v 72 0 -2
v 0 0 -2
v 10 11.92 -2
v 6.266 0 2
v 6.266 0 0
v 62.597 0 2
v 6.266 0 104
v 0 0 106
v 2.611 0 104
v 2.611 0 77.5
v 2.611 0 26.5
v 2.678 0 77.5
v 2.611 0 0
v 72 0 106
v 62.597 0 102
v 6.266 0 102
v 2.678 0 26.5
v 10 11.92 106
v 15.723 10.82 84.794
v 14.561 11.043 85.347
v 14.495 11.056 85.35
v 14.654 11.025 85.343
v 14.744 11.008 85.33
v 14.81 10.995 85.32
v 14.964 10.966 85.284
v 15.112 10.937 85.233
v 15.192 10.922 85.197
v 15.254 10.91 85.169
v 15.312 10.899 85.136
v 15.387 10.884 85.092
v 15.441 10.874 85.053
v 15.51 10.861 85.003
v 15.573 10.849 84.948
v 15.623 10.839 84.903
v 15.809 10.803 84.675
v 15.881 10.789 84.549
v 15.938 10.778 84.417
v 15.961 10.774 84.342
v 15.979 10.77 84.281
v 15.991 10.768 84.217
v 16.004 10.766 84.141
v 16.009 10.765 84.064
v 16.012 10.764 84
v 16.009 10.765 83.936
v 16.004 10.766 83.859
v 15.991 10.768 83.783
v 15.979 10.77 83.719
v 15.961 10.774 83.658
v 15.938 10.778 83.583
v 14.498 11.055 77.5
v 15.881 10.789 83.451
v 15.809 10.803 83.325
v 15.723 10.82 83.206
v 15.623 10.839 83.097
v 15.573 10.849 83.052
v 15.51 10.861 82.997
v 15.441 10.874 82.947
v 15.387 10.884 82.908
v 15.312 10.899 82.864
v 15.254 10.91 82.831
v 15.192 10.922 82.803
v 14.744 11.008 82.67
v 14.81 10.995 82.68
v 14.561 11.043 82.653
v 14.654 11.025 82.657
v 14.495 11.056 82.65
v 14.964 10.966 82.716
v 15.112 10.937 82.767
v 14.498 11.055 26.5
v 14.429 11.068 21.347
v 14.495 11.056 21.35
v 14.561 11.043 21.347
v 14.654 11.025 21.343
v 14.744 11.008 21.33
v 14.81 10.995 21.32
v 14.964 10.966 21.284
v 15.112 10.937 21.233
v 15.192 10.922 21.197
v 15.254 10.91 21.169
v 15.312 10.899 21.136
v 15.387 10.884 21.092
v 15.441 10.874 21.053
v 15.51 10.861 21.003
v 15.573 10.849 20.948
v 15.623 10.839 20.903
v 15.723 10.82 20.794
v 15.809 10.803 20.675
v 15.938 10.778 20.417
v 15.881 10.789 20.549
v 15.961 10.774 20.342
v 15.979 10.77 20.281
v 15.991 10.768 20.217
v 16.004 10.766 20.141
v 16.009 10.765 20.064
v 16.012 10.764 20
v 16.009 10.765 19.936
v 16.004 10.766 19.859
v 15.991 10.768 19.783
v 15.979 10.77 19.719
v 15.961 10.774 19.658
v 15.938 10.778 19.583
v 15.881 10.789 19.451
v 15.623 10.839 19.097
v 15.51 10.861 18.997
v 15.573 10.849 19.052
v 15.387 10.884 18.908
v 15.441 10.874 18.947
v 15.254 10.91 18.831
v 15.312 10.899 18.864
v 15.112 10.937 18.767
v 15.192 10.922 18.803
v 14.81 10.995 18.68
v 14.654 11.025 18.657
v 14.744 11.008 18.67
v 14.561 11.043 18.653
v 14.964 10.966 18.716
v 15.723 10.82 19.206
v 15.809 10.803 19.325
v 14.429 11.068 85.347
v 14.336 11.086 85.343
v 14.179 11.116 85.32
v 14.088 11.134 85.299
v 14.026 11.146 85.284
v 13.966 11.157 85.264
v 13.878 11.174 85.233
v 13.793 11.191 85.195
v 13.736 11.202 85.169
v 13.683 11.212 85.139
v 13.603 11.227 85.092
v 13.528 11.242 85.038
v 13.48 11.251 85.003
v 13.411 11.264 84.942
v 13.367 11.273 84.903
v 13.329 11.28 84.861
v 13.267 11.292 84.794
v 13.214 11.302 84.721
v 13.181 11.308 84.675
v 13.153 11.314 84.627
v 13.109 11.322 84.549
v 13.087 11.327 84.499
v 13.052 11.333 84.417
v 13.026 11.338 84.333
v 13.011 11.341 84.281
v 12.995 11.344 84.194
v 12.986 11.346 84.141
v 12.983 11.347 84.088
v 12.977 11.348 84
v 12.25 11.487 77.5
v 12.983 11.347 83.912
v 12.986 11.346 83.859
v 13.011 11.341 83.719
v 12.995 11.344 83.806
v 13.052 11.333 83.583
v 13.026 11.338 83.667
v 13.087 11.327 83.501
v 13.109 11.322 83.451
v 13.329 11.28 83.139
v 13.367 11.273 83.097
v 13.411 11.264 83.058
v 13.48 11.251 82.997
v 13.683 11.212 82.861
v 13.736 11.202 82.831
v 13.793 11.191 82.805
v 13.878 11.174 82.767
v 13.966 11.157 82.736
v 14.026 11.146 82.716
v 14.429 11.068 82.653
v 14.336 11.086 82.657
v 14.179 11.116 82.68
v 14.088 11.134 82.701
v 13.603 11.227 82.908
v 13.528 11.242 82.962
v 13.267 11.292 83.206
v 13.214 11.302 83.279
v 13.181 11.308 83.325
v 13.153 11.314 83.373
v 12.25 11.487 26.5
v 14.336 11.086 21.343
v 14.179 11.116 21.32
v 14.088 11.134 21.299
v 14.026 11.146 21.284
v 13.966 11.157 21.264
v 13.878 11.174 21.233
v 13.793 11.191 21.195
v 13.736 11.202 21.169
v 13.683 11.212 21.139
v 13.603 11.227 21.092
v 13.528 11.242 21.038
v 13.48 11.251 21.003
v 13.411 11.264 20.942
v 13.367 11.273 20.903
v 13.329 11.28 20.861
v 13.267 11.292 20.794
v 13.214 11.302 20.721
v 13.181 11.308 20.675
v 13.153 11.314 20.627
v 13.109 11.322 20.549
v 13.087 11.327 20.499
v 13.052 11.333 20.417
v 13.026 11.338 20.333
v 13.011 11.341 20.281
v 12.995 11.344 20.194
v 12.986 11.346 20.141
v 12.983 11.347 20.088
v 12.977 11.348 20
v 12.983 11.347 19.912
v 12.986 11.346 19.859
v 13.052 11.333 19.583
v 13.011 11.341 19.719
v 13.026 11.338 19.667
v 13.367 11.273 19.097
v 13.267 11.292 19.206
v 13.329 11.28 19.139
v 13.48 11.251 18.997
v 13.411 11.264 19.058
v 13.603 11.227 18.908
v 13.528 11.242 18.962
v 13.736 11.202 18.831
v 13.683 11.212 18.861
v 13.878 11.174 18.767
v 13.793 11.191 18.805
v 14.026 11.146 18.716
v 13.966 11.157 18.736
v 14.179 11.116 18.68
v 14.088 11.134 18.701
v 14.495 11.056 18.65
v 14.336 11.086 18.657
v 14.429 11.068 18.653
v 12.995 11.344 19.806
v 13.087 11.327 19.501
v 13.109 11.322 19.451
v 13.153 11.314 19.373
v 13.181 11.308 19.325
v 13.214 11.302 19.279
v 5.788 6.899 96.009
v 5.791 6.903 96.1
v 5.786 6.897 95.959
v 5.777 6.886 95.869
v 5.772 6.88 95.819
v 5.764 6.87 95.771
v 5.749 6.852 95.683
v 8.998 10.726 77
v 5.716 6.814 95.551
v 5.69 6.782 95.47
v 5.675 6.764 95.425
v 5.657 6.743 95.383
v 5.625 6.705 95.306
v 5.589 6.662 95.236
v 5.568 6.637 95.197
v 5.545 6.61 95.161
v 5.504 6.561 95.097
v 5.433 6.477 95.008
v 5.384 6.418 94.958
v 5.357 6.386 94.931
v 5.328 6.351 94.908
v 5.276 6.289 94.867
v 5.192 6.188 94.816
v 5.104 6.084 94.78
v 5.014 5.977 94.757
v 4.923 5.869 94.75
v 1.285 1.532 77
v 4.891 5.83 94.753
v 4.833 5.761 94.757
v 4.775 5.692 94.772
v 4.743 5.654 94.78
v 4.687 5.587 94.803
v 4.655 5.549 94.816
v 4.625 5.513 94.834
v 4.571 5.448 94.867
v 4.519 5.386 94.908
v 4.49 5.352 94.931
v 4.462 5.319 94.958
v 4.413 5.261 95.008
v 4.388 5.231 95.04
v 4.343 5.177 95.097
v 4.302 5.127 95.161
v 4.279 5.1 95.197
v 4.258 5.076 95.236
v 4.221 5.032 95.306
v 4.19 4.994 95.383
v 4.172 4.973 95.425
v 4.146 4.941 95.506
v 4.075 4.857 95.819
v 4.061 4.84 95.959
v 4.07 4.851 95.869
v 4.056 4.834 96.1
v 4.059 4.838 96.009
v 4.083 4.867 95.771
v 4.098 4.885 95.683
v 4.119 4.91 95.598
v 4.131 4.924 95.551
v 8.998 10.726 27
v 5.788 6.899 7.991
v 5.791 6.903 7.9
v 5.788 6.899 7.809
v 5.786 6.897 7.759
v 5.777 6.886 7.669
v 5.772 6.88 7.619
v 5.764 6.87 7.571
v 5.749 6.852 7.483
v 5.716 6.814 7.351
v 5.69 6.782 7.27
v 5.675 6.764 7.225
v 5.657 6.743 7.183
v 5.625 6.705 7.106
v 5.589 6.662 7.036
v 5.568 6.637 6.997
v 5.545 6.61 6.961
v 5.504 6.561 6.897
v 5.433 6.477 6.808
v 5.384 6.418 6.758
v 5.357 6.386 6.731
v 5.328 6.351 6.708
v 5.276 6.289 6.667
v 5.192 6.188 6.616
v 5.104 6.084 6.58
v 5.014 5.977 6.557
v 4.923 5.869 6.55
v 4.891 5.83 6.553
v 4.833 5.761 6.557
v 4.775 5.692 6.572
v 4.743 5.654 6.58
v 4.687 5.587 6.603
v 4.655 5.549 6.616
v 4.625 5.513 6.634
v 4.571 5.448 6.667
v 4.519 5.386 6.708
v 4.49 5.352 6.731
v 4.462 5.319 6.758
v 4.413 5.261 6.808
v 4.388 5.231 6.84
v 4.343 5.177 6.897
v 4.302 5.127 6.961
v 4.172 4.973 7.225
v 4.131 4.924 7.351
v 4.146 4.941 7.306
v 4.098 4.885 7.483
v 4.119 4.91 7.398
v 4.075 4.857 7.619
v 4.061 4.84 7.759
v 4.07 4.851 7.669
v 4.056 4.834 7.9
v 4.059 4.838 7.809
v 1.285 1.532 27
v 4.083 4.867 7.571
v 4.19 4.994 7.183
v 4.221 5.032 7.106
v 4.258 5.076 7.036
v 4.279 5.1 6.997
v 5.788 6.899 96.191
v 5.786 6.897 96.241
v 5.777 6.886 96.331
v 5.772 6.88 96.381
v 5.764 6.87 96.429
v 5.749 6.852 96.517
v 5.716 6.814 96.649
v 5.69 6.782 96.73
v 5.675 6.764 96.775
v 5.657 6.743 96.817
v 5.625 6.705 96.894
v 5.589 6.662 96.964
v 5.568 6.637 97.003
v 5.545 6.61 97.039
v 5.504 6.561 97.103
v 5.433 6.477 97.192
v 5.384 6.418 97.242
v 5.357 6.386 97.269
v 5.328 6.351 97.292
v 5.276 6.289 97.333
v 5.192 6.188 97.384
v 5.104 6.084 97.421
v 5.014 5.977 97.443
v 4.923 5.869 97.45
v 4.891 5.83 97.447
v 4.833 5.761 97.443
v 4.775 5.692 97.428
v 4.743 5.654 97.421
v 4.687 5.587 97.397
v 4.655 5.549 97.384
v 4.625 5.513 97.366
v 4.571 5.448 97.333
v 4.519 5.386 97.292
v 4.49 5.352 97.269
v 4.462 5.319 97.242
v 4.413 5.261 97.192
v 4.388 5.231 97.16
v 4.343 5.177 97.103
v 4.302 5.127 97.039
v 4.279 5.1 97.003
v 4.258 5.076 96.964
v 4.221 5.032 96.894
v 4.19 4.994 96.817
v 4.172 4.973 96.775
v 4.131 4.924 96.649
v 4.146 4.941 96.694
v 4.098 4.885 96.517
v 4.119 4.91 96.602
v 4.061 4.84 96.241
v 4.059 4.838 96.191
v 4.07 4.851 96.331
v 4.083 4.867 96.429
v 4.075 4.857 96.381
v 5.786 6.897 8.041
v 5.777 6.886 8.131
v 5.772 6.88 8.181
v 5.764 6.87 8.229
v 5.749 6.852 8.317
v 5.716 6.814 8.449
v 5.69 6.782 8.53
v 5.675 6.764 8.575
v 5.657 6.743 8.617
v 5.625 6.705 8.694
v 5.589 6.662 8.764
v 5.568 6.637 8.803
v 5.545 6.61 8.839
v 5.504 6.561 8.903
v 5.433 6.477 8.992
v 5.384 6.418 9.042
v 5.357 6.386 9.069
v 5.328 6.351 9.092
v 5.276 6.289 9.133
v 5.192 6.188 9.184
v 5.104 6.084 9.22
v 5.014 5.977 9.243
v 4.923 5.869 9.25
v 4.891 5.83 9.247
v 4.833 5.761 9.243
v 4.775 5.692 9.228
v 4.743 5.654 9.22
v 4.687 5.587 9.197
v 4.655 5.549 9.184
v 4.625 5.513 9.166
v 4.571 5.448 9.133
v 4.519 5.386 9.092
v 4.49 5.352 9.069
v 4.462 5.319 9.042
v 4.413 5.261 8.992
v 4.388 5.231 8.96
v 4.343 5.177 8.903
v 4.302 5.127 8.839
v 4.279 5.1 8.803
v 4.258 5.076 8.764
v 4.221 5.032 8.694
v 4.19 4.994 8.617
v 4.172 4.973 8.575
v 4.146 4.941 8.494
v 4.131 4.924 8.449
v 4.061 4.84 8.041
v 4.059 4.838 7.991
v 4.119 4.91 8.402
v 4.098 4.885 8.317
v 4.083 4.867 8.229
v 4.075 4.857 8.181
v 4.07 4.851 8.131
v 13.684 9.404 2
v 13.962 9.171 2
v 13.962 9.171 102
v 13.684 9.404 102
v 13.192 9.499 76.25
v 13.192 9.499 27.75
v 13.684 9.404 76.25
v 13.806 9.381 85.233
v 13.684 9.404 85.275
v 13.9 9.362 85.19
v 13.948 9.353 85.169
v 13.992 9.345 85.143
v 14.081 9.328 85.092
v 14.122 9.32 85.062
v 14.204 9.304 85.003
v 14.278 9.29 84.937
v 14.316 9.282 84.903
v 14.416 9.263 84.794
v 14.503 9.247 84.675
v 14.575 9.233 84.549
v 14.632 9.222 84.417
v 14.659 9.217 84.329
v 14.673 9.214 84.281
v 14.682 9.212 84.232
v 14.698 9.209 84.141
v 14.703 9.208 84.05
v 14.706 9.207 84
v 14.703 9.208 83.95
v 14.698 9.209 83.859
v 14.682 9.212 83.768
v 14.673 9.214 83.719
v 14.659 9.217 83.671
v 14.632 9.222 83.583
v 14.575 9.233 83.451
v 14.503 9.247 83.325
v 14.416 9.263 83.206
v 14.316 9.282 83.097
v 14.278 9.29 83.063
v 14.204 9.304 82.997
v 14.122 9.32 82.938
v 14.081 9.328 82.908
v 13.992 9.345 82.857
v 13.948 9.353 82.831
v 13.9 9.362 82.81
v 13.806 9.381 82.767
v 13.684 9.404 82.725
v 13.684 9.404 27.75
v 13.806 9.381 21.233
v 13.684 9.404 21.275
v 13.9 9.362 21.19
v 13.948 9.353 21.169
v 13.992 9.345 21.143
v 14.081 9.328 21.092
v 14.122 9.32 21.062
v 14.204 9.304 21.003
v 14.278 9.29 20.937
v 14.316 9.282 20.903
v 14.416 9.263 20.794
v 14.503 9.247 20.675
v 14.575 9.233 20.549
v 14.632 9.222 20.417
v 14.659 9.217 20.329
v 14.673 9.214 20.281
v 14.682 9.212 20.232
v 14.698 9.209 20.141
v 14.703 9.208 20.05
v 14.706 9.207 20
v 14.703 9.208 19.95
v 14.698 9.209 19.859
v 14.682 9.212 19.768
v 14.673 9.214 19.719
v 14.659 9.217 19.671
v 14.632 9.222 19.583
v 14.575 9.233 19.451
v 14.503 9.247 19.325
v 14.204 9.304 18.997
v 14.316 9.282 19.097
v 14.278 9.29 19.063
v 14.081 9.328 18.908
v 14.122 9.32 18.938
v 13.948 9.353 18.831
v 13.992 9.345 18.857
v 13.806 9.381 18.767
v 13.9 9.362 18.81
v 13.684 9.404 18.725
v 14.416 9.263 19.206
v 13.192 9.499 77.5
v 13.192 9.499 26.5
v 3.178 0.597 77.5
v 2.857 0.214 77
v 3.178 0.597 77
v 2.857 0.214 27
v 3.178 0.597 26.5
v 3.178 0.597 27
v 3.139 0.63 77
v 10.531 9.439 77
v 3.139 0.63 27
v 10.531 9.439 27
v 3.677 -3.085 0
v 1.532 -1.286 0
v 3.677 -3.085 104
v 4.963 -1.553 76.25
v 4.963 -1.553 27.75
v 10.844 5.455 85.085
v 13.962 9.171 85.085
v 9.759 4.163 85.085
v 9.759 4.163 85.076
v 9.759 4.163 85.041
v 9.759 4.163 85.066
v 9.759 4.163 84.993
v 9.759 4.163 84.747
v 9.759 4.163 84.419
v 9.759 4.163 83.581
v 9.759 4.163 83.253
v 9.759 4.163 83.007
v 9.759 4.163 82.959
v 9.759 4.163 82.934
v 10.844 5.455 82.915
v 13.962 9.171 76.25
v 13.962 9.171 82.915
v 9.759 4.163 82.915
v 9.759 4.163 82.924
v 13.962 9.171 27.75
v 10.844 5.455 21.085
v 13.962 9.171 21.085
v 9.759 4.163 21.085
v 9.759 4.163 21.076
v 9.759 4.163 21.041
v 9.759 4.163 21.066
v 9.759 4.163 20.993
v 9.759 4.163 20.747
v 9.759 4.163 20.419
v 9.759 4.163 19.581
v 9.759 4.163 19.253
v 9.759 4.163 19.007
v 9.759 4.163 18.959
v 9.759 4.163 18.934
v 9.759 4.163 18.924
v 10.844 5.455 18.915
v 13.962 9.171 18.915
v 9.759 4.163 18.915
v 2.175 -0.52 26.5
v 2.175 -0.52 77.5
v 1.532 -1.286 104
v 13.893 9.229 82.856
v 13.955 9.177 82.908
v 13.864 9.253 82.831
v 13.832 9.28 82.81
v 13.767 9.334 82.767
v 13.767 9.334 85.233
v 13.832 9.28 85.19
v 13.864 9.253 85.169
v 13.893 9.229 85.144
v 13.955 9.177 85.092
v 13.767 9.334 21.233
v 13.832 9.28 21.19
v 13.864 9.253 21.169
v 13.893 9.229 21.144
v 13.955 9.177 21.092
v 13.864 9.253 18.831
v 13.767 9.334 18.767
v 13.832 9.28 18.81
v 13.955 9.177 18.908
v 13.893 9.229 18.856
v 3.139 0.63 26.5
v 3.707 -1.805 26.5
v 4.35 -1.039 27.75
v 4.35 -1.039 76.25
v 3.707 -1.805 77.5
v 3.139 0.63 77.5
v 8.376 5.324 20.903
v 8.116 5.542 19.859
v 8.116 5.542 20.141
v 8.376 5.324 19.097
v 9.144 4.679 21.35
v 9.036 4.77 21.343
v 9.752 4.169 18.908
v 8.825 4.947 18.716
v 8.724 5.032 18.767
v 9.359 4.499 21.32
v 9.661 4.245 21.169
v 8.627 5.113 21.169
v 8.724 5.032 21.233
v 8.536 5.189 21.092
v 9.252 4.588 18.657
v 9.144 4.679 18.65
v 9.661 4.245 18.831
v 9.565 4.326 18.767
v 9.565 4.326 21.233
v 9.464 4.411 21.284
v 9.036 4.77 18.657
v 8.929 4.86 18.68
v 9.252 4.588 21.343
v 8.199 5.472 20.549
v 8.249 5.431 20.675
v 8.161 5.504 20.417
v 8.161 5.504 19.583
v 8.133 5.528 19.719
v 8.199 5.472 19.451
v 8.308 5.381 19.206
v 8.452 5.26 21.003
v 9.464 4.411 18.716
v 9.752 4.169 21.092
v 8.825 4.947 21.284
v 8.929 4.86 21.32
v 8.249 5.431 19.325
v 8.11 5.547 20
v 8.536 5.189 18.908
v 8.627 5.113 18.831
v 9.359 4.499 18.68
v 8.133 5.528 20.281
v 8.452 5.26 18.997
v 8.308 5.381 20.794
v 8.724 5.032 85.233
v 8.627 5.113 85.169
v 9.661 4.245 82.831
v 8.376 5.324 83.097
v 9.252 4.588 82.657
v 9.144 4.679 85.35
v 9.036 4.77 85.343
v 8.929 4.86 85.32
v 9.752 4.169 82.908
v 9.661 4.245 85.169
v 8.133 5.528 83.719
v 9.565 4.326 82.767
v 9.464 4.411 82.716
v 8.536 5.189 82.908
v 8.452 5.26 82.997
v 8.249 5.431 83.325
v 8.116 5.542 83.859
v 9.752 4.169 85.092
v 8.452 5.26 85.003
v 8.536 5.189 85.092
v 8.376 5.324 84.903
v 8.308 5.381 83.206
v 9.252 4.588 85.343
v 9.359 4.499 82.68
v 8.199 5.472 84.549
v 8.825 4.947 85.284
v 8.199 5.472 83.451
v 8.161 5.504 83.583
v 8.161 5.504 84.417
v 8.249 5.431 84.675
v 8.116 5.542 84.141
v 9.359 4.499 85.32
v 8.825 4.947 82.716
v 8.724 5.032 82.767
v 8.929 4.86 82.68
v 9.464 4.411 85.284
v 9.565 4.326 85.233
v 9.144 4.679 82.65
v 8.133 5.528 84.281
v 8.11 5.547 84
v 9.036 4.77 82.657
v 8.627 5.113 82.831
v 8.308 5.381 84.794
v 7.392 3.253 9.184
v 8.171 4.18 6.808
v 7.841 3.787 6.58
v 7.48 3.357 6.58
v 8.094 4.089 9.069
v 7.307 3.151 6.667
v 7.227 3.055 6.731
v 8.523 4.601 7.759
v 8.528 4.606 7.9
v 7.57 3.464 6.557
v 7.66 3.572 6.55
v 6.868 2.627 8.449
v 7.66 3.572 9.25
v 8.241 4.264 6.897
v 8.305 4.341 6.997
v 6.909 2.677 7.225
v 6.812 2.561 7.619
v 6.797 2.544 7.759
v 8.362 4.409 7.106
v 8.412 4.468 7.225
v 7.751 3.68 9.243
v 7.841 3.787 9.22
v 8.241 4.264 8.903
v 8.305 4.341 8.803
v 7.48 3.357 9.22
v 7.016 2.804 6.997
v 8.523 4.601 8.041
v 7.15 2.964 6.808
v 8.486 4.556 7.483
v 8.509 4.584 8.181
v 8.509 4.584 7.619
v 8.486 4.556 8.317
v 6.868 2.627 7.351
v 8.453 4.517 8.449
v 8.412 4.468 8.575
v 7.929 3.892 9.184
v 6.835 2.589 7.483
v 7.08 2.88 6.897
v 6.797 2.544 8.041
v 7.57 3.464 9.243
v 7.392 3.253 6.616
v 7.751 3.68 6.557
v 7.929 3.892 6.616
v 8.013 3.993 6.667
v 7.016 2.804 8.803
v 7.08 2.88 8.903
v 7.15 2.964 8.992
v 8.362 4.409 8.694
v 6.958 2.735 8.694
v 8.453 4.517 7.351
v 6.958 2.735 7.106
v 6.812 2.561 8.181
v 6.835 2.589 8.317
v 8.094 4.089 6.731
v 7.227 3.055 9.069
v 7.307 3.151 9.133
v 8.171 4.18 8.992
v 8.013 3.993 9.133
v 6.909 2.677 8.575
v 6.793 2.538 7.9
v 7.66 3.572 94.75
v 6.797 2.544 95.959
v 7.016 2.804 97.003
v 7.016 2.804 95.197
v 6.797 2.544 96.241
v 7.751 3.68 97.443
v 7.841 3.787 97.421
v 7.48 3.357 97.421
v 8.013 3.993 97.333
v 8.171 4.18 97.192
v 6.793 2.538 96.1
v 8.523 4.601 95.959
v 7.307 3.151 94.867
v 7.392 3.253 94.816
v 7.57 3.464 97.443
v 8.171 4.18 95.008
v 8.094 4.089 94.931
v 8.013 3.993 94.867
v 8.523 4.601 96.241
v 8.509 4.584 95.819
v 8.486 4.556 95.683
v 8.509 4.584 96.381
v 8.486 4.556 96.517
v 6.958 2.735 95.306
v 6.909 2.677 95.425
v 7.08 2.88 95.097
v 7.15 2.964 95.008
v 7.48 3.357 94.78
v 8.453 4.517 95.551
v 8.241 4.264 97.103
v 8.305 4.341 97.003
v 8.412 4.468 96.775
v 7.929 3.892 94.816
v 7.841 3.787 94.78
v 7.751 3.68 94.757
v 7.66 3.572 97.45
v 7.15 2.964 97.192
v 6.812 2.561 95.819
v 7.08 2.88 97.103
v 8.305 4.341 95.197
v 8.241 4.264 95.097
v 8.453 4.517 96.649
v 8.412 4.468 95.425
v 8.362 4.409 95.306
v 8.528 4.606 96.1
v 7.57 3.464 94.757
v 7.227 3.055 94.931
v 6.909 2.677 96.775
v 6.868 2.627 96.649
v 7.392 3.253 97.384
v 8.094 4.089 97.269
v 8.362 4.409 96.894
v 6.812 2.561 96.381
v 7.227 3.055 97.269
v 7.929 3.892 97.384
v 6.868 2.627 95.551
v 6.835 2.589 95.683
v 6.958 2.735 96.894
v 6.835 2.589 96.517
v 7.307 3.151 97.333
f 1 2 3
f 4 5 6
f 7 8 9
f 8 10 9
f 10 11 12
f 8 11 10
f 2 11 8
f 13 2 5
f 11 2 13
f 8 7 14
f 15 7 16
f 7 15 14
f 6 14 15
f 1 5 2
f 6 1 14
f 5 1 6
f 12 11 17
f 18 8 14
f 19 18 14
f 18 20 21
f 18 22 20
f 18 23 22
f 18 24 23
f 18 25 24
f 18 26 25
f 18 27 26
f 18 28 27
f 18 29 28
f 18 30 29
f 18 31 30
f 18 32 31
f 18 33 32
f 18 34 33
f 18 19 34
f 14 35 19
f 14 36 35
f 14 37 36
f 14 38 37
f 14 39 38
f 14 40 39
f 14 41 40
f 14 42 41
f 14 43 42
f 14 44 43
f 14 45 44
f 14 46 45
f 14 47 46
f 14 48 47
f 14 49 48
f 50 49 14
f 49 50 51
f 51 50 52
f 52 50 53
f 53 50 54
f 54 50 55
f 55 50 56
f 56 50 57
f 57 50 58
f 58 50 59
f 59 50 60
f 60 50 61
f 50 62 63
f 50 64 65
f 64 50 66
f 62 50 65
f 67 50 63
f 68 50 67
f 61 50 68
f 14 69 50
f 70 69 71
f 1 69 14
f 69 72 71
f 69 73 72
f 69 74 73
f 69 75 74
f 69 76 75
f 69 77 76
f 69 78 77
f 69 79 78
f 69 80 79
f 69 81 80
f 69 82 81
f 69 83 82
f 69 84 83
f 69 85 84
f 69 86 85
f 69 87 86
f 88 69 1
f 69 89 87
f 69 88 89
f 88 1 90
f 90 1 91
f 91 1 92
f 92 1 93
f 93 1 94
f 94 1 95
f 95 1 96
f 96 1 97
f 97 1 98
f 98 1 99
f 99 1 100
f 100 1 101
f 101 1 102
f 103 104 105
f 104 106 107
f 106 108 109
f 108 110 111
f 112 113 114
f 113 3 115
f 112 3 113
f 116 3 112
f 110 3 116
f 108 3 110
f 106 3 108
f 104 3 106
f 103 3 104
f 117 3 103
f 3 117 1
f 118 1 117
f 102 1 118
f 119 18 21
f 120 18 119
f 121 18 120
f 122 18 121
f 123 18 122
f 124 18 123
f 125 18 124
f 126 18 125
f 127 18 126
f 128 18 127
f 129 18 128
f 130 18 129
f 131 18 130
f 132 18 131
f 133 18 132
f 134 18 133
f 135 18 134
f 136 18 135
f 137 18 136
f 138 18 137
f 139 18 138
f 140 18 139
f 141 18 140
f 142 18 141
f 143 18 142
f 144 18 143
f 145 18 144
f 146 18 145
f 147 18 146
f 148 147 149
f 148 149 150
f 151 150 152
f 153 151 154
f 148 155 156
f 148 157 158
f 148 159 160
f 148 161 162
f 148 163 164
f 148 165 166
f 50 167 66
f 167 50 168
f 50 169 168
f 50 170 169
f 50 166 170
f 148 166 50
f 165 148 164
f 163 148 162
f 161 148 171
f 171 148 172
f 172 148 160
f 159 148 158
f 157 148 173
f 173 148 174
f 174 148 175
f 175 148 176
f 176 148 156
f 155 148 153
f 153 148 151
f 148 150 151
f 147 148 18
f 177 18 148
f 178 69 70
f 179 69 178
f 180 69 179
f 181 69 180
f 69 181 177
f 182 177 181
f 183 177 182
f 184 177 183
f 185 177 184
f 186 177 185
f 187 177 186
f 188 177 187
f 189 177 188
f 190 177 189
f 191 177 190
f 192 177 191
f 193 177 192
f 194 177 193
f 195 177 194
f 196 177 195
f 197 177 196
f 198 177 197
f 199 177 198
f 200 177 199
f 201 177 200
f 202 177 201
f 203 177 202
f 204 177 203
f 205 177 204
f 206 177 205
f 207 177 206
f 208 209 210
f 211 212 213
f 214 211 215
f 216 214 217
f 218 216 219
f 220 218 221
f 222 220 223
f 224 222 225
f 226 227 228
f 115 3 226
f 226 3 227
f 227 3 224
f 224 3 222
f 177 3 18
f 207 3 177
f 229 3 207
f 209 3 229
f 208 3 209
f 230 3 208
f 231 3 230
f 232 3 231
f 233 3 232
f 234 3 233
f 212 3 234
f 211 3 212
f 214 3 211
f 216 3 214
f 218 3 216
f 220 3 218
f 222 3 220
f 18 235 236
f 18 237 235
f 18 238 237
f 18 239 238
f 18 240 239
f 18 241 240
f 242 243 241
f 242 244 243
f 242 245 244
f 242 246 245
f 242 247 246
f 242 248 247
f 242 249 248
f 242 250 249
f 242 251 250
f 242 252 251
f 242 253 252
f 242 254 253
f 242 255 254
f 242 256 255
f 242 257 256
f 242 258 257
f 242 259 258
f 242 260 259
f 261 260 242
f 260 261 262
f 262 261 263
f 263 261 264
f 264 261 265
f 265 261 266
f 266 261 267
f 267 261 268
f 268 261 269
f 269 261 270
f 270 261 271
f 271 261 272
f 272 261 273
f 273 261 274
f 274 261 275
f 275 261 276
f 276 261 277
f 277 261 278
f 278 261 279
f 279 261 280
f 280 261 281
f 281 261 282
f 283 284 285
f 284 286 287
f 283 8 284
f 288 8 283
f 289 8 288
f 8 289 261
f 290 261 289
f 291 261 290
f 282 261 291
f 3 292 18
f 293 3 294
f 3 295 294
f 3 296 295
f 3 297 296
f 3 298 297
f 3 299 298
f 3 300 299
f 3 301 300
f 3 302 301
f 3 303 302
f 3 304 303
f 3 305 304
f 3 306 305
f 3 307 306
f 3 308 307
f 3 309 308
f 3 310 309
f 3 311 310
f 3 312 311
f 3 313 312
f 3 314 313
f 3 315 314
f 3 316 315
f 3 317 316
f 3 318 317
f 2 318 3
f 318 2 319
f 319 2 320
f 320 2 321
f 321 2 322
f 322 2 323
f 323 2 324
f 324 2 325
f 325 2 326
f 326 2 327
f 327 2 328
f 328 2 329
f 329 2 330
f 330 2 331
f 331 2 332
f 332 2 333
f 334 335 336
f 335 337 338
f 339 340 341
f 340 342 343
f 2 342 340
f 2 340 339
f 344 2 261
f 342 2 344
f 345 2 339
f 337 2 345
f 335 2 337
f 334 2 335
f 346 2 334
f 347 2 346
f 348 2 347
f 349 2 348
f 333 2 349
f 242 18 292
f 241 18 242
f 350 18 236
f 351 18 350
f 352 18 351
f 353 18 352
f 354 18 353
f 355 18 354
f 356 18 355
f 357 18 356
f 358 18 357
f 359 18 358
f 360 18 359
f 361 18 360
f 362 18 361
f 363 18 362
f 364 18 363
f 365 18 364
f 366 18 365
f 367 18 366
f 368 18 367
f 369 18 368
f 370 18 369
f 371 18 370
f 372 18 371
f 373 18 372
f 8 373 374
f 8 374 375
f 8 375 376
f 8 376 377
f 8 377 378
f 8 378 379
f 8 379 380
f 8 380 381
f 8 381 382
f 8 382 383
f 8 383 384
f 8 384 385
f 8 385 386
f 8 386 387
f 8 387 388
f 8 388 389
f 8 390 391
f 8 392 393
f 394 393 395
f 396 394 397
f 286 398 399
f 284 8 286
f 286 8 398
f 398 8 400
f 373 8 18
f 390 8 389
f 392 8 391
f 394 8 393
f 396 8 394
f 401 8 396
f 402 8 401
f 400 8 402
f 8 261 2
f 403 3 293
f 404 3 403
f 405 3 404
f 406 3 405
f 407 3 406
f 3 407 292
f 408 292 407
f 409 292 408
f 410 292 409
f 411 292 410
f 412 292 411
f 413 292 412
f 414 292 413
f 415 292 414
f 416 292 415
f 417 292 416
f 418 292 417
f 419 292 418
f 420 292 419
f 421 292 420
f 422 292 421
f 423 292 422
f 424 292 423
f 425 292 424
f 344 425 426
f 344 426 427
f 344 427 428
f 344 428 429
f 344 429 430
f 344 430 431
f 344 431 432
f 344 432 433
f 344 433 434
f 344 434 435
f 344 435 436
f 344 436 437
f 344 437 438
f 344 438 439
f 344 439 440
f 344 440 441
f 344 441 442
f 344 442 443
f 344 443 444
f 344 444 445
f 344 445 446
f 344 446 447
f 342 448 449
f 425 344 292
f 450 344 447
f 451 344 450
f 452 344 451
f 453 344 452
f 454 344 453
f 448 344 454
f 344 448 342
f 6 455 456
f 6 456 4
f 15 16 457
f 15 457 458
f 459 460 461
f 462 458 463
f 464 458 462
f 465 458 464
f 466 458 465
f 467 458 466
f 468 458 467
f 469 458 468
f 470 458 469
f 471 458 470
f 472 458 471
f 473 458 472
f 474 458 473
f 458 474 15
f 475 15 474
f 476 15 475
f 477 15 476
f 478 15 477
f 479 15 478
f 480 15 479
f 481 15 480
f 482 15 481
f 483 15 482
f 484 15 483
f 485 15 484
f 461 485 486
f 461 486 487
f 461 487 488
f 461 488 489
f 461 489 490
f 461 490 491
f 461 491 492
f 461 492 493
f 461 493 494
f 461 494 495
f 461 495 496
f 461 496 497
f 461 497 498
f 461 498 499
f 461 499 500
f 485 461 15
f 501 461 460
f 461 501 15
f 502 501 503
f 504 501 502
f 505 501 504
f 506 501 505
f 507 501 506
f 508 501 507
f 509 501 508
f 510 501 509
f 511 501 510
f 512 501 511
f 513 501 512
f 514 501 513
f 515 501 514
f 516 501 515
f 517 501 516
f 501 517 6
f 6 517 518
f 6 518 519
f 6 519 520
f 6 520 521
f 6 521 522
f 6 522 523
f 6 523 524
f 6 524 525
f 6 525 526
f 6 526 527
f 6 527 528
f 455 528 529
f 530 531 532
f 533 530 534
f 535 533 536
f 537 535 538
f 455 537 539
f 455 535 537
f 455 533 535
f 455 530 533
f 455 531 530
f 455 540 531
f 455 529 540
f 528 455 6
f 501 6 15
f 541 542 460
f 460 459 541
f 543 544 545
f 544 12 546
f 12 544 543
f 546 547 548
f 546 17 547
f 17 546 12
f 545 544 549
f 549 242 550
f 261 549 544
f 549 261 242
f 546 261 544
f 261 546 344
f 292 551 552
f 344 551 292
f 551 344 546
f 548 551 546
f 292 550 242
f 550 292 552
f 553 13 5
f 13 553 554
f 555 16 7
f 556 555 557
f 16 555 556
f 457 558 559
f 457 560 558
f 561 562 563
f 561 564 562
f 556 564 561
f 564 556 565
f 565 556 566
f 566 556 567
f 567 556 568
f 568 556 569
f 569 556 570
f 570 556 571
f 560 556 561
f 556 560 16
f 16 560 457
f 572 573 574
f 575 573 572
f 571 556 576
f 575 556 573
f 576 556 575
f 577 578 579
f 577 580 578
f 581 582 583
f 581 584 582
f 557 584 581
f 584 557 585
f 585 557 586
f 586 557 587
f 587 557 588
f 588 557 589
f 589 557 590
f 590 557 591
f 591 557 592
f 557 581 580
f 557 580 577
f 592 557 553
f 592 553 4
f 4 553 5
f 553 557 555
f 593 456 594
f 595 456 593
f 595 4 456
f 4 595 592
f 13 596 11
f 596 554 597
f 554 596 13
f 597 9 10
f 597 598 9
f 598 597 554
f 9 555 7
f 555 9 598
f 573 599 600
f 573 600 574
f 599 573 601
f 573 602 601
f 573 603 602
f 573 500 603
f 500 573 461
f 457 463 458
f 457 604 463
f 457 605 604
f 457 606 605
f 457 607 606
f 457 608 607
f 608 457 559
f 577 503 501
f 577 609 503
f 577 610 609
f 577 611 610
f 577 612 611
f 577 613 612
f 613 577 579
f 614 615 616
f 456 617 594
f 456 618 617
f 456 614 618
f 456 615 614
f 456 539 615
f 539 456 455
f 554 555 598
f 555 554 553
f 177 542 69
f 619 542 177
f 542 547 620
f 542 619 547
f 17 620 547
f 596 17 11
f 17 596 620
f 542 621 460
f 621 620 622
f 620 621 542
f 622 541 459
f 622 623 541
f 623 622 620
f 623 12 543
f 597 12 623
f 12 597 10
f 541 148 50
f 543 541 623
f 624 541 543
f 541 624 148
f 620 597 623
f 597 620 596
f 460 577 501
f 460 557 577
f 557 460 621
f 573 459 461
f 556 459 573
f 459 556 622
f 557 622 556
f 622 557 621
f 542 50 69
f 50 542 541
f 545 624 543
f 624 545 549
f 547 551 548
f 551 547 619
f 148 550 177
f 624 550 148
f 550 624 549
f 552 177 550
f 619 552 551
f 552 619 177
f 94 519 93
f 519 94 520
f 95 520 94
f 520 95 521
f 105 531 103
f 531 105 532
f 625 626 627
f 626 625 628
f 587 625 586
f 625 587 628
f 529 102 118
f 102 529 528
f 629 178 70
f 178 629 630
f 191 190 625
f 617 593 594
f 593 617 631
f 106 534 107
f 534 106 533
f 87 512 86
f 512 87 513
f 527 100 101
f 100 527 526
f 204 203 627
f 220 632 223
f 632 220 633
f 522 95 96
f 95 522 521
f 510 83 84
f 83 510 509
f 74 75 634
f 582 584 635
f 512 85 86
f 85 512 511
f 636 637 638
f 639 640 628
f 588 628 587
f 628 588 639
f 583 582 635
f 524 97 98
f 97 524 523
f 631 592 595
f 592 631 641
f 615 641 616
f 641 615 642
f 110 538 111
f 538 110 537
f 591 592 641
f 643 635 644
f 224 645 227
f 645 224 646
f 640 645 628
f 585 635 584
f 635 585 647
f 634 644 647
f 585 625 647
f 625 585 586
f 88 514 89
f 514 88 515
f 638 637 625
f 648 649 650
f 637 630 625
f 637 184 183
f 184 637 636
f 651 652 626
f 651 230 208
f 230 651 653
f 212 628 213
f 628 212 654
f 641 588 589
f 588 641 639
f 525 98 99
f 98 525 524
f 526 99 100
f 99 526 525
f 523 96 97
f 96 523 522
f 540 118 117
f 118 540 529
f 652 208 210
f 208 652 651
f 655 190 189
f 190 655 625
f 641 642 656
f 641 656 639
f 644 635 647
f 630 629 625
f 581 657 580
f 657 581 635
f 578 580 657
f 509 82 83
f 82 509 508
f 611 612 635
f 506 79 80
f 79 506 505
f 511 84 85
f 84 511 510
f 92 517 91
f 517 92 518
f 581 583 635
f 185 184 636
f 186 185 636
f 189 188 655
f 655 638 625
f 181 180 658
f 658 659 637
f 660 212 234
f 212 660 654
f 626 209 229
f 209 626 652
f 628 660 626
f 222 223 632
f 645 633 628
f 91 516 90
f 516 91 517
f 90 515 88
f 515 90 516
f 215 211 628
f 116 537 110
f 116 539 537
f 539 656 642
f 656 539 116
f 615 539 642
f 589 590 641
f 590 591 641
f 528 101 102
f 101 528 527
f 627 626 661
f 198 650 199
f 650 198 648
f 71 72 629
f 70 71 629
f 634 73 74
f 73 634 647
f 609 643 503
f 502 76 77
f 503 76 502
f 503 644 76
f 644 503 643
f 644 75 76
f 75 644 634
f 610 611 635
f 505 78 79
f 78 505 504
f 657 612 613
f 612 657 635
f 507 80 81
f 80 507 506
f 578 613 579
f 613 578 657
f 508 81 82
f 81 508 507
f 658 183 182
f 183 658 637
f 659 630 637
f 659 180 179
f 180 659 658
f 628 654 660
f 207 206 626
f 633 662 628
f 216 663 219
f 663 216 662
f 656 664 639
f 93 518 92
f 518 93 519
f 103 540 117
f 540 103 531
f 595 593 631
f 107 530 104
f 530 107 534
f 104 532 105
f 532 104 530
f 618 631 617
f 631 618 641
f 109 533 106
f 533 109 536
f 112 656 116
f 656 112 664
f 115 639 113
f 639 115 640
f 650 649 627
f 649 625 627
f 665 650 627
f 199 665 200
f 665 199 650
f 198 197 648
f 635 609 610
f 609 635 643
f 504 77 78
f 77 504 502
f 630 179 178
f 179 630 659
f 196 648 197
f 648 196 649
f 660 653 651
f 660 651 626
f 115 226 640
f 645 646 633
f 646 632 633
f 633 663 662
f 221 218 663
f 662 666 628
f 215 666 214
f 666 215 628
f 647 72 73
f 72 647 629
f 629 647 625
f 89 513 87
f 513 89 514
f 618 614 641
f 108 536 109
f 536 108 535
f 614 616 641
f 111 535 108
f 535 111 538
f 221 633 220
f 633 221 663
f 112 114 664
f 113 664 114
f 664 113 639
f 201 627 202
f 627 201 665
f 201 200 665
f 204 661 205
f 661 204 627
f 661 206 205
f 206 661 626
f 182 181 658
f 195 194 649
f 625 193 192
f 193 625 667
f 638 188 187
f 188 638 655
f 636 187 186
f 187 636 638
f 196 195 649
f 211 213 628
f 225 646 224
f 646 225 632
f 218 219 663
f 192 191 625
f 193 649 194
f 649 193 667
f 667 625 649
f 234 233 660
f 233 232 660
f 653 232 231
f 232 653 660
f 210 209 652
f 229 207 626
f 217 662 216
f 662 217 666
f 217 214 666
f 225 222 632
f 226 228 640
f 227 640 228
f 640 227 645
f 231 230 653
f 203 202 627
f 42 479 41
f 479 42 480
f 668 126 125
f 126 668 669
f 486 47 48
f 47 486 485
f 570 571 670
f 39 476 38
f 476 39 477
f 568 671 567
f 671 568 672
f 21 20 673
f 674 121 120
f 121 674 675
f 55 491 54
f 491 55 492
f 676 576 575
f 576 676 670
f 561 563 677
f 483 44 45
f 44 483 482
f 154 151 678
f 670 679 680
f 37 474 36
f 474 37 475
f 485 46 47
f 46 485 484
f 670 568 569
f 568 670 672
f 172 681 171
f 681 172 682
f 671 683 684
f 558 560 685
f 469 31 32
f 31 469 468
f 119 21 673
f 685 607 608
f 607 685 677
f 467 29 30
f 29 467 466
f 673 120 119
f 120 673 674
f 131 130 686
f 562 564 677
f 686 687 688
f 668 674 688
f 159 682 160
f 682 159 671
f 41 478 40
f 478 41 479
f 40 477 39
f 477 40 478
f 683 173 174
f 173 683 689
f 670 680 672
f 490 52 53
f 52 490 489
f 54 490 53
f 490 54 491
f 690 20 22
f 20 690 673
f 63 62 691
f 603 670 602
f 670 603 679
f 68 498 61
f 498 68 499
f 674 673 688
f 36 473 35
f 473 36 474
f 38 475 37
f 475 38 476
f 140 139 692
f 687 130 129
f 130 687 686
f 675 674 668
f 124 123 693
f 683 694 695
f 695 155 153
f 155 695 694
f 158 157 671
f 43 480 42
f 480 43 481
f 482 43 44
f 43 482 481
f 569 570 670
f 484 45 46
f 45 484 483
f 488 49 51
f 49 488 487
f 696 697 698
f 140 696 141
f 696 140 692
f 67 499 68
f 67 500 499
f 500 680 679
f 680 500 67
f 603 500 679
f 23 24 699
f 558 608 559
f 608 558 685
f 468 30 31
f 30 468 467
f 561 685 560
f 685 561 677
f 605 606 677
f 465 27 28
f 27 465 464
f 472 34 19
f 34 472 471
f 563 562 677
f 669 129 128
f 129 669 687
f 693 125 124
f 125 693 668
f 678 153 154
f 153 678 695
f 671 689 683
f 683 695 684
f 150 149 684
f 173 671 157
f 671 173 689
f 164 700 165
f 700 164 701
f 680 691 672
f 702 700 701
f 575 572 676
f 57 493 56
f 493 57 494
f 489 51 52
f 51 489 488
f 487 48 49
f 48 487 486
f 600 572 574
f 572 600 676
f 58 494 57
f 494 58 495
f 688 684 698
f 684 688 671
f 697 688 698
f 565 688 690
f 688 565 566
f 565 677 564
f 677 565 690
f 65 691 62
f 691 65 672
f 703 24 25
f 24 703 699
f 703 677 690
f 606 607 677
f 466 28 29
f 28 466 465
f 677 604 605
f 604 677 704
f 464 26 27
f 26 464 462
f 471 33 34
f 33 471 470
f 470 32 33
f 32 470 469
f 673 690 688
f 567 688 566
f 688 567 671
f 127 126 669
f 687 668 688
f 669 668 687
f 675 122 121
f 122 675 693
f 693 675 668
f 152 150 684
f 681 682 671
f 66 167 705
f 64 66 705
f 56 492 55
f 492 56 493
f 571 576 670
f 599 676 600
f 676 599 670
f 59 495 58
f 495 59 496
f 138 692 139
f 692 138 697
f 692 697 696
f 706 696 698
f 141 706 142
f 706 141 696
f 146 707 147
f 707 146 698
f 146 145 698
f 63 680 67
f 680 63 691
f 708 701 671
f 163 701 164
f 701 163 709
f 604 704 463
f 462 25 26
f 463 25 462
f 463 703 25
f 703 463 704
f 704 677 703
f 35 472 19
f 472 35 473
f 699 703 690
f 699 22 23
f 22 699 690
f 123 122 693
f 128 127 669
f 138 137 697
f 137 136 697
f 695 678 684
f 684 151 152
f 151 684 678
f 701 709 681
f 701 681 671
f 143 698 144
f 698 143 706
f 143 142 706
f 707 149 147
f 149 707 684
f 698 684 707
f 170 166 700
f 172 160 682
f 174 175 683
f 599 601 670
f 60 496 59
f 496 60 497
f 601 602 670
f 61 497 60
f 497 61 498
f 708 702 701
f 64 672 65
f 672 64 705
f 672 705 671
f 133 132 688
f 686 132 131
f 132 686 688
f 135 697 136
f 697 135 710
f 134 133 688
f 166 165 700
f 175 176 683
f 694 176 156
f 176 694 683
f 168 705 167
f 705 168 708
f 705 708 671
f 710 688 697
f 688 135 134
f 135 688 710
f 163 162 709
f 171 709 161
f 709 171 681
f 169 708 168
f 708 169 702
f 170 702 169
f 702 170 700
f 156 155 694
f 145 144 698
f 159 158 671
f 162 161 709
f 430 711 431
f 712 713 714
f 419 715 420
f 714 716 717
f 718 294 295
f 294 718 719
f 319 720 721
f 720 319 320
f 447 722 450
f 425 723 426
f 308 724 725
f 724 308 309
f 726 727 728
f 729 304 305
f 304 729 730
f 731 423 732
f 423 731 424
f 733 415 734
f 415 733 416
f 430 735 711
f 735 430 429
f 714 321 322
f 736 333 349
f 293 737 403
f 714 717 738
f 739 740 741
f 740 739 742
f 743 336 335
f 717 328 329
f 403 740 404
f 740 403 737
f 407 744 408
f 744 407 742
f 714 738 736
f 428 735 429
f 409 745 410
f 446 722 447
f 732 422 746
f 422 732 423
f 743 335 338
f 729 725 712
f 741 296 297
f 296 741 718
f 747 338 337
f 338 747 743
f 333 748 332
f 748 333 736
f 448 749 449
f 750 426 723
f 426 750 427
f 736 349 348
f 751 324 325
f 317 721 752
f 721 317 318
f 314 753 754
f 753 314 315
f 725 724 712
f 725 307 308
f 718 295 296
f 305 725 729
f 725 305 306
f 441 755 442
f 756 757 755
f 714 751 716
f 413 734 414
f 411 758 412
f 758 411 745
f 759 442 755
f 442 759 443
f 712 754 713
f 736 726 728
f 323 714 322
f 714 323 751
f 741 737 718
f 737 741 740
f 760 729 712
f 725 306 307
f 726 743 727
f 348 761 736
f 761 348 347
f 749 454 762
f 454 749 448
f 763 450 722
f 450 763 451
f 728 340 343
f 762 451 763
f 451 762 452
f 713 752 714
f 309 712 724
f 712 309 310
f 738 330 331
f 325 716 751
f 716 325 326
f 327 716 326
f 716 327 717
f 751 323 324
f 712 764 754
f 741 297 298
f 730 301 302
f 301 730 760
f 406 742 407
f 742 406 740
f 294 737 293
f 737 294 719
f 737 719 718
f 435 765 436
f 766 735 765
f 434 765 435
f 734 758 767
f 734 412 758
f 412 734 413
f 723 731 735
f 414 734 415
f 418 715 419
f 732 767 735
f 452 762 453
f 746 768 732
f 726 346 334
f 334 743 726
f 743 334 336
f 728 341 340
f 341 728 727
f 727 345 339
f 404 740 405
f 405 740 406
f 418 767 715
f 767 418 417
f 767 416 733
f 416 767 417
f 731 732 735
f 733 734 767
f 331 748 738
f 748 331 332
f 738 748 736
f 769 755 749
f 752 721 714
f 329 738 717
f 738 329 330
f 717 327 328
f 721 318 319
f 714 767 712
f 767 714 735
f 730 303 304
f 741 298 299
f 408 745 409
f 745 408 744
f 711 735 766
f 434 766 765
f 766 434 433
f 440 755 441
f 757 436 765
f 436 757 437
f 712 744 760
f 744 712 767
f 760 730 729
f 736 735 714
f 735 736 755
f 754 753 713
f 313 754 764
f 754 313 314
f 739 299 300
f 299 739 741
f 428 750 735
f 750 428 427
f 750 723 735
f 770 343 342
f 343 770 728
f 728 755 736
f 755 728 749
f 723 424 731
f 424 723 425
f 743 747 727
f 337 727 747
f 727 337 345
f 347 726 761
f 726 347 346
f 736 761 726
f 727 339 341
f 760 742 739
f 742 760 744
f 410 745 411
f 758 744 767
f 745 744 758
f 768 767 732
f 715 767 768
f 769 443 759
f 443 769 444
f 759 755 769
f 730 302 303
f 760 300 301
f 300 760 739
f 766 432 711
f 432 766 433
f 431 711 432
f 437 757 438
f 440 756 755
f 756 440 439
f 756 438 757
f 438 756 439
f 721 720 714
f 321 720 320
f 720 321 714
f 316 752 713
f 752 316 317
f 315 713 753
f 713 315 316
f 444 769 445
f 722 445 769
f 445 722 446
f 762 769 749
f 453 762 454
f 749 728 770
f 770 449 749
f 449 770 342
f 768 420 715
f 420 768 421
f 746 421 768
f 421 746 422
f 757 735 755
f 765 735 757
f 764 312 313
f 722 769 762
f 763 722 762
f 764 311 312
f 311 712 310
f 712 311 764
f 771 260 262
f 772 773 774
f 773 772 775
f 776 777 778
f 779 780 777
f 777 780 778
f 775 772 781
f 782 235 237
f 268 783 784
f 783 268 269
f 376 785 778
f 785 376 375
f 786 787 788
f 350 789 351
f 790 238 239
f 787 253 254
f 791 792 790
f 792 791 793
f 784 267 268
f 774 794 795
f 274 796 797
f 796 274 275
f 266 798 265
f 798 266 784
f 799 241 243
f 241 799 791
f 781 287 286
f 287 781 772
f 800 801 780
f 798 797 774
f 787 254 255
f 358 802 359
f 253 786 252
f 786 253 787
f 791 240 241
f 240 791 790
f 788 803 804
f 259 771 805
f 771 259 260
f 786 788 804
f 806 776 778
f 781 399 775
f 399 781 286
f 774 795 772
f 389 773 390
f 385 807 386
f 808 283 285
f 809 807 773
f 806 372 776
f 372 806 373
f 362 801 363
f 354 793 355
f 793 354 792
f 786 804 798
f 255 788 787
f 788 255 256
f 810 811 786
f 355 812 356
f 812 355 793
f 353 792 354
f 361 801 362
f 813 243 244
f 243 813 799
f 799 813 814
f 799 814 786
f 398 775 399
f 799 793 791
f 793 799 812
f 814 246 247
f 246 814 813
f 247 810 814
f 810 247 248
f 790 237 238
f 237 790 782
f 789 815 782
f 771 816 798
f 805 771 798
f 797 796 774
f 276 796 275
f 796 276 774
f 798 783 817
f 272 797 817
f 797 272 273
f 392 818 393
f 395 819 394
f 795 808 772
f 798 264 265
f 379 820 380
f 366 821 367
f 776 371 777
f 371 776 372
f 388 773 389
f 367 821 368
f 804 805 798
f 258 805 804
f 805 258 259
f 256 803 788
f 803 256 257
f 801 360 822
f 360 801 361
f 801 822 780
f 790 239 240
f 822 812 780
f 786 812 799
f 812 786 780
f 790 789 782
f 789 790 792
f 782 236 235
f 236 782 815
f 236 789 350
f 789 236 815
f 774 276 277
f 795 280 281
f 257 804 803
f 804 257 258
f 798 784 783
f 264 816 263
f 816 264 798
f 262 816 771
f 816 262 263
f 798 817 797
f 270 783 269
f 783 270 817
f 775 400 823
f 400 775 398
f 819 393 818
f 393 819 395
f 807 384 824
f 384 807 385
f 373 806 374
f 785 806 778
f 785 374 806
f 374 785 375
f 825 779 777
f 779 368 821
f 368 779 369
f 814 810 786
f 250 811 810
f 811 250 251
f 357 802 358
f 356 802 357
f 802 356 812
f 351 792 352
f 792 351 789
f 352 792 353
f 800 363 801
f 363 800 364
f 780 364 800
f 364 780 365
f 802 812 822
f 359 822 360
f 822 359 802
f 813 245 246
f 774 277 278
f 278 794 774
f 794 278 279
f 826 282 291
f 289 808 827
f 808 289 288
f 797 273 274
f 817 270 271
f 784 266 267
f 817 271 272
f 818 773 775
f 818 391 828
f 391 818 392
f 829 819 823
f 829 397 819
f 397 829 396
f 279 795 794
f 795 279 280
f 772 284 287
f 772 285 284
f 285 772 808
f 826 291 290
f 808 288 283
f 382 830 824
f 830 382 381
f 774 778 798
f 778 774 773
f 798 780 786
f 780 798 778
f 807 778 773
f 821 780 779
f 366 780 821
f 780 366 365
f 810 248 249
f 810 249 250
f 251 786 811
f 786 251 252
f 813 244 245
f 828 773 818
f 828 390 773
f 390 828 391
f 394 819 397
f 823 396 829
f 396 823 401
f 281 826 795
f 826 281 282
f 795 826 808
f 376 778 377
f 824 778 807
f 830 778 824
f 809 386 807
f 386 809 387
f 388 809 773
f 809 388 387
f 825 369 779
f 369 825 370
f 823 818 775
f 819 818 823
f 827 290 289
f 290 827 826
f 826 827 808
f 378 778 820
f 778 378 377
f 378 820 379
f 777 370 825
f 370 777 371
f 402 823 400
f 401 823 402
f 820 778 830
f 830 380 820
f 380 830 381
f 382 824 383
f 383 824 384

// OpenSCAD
//UVC-LED housing

$fn=60;

UVC_housing();
//filterholder();
//UVC_filter_protect();

module UVC_housing() {
difference() {
    union() {
        UVC_module();
        rotate([90, 90, 50]) translate([-80, 0, 2]) filterholder();
    //translate([26.5, 8.4, 2]) cube([6.7, 22, 6.7]);
    
    }
    rotate([90, 270, 50]) translate([26.5, -24.5, 2]) cube([51, 22, 2]); 
    //screws for filter-protect
    translate([22, 20, 20]) rotate([90, 0, -90+50]) cylinder(d=2.7, h=20);
    translate([22, 20, 104-20]) rotate([90, 0, -90+50]) cylinder(d=2.7, h=20);
    translate([0, 10, 7.9]) rotate([0, 90, -40]) cylinder(d=2.7, h=10);
    translate([0, 10, 104-7.9]) rotate([0, 90, -40]) cylinder(d=2.7, h=10);
}    
//#rotate([90, 90, 50]) translate([-80, 0, 2]) filterholder();
}

module UVC_module() {
difference() {
    translate([0, 0, -2])
linear_extrude(height = 108, scale = 1) 
//polygon(points=[[0,0],[72,0],[16.713, 19.917]]);
    polygon(points=[[0,0],[72,0],[10, 11.92]]);
translate([1,-2,2])
linear_extrude(height = 100, scale = 1) 
polygon(points=[[0,0],[72,0],[10, 11.92]]);
    rotate ([0,0,50]) translate([2,-10,27]) cube([12,22,50]);
}
}

module filterholder() {
difference() {
translate([-24, 0, 0]) cube([104, 16, 2.8]);  //104 war 56
translate([2.5, 1, 0]) cube([51, 15, 2]);
//translate([3.75, 0, 0]) cube([48.5, 13, 8]);
translate([3.75, 2, -1]) cube([48.5, 18, 8]);
}
}

module UVC_filter_protect() {
    difference() {
        cube([76, 8, 2]);
        translate([6, 4.5, -1]) cylinder(d=3.2, h=4);
        translate([6+64, 4.5, -1]) cylinder(d=3.2, h=4);
    }
}
